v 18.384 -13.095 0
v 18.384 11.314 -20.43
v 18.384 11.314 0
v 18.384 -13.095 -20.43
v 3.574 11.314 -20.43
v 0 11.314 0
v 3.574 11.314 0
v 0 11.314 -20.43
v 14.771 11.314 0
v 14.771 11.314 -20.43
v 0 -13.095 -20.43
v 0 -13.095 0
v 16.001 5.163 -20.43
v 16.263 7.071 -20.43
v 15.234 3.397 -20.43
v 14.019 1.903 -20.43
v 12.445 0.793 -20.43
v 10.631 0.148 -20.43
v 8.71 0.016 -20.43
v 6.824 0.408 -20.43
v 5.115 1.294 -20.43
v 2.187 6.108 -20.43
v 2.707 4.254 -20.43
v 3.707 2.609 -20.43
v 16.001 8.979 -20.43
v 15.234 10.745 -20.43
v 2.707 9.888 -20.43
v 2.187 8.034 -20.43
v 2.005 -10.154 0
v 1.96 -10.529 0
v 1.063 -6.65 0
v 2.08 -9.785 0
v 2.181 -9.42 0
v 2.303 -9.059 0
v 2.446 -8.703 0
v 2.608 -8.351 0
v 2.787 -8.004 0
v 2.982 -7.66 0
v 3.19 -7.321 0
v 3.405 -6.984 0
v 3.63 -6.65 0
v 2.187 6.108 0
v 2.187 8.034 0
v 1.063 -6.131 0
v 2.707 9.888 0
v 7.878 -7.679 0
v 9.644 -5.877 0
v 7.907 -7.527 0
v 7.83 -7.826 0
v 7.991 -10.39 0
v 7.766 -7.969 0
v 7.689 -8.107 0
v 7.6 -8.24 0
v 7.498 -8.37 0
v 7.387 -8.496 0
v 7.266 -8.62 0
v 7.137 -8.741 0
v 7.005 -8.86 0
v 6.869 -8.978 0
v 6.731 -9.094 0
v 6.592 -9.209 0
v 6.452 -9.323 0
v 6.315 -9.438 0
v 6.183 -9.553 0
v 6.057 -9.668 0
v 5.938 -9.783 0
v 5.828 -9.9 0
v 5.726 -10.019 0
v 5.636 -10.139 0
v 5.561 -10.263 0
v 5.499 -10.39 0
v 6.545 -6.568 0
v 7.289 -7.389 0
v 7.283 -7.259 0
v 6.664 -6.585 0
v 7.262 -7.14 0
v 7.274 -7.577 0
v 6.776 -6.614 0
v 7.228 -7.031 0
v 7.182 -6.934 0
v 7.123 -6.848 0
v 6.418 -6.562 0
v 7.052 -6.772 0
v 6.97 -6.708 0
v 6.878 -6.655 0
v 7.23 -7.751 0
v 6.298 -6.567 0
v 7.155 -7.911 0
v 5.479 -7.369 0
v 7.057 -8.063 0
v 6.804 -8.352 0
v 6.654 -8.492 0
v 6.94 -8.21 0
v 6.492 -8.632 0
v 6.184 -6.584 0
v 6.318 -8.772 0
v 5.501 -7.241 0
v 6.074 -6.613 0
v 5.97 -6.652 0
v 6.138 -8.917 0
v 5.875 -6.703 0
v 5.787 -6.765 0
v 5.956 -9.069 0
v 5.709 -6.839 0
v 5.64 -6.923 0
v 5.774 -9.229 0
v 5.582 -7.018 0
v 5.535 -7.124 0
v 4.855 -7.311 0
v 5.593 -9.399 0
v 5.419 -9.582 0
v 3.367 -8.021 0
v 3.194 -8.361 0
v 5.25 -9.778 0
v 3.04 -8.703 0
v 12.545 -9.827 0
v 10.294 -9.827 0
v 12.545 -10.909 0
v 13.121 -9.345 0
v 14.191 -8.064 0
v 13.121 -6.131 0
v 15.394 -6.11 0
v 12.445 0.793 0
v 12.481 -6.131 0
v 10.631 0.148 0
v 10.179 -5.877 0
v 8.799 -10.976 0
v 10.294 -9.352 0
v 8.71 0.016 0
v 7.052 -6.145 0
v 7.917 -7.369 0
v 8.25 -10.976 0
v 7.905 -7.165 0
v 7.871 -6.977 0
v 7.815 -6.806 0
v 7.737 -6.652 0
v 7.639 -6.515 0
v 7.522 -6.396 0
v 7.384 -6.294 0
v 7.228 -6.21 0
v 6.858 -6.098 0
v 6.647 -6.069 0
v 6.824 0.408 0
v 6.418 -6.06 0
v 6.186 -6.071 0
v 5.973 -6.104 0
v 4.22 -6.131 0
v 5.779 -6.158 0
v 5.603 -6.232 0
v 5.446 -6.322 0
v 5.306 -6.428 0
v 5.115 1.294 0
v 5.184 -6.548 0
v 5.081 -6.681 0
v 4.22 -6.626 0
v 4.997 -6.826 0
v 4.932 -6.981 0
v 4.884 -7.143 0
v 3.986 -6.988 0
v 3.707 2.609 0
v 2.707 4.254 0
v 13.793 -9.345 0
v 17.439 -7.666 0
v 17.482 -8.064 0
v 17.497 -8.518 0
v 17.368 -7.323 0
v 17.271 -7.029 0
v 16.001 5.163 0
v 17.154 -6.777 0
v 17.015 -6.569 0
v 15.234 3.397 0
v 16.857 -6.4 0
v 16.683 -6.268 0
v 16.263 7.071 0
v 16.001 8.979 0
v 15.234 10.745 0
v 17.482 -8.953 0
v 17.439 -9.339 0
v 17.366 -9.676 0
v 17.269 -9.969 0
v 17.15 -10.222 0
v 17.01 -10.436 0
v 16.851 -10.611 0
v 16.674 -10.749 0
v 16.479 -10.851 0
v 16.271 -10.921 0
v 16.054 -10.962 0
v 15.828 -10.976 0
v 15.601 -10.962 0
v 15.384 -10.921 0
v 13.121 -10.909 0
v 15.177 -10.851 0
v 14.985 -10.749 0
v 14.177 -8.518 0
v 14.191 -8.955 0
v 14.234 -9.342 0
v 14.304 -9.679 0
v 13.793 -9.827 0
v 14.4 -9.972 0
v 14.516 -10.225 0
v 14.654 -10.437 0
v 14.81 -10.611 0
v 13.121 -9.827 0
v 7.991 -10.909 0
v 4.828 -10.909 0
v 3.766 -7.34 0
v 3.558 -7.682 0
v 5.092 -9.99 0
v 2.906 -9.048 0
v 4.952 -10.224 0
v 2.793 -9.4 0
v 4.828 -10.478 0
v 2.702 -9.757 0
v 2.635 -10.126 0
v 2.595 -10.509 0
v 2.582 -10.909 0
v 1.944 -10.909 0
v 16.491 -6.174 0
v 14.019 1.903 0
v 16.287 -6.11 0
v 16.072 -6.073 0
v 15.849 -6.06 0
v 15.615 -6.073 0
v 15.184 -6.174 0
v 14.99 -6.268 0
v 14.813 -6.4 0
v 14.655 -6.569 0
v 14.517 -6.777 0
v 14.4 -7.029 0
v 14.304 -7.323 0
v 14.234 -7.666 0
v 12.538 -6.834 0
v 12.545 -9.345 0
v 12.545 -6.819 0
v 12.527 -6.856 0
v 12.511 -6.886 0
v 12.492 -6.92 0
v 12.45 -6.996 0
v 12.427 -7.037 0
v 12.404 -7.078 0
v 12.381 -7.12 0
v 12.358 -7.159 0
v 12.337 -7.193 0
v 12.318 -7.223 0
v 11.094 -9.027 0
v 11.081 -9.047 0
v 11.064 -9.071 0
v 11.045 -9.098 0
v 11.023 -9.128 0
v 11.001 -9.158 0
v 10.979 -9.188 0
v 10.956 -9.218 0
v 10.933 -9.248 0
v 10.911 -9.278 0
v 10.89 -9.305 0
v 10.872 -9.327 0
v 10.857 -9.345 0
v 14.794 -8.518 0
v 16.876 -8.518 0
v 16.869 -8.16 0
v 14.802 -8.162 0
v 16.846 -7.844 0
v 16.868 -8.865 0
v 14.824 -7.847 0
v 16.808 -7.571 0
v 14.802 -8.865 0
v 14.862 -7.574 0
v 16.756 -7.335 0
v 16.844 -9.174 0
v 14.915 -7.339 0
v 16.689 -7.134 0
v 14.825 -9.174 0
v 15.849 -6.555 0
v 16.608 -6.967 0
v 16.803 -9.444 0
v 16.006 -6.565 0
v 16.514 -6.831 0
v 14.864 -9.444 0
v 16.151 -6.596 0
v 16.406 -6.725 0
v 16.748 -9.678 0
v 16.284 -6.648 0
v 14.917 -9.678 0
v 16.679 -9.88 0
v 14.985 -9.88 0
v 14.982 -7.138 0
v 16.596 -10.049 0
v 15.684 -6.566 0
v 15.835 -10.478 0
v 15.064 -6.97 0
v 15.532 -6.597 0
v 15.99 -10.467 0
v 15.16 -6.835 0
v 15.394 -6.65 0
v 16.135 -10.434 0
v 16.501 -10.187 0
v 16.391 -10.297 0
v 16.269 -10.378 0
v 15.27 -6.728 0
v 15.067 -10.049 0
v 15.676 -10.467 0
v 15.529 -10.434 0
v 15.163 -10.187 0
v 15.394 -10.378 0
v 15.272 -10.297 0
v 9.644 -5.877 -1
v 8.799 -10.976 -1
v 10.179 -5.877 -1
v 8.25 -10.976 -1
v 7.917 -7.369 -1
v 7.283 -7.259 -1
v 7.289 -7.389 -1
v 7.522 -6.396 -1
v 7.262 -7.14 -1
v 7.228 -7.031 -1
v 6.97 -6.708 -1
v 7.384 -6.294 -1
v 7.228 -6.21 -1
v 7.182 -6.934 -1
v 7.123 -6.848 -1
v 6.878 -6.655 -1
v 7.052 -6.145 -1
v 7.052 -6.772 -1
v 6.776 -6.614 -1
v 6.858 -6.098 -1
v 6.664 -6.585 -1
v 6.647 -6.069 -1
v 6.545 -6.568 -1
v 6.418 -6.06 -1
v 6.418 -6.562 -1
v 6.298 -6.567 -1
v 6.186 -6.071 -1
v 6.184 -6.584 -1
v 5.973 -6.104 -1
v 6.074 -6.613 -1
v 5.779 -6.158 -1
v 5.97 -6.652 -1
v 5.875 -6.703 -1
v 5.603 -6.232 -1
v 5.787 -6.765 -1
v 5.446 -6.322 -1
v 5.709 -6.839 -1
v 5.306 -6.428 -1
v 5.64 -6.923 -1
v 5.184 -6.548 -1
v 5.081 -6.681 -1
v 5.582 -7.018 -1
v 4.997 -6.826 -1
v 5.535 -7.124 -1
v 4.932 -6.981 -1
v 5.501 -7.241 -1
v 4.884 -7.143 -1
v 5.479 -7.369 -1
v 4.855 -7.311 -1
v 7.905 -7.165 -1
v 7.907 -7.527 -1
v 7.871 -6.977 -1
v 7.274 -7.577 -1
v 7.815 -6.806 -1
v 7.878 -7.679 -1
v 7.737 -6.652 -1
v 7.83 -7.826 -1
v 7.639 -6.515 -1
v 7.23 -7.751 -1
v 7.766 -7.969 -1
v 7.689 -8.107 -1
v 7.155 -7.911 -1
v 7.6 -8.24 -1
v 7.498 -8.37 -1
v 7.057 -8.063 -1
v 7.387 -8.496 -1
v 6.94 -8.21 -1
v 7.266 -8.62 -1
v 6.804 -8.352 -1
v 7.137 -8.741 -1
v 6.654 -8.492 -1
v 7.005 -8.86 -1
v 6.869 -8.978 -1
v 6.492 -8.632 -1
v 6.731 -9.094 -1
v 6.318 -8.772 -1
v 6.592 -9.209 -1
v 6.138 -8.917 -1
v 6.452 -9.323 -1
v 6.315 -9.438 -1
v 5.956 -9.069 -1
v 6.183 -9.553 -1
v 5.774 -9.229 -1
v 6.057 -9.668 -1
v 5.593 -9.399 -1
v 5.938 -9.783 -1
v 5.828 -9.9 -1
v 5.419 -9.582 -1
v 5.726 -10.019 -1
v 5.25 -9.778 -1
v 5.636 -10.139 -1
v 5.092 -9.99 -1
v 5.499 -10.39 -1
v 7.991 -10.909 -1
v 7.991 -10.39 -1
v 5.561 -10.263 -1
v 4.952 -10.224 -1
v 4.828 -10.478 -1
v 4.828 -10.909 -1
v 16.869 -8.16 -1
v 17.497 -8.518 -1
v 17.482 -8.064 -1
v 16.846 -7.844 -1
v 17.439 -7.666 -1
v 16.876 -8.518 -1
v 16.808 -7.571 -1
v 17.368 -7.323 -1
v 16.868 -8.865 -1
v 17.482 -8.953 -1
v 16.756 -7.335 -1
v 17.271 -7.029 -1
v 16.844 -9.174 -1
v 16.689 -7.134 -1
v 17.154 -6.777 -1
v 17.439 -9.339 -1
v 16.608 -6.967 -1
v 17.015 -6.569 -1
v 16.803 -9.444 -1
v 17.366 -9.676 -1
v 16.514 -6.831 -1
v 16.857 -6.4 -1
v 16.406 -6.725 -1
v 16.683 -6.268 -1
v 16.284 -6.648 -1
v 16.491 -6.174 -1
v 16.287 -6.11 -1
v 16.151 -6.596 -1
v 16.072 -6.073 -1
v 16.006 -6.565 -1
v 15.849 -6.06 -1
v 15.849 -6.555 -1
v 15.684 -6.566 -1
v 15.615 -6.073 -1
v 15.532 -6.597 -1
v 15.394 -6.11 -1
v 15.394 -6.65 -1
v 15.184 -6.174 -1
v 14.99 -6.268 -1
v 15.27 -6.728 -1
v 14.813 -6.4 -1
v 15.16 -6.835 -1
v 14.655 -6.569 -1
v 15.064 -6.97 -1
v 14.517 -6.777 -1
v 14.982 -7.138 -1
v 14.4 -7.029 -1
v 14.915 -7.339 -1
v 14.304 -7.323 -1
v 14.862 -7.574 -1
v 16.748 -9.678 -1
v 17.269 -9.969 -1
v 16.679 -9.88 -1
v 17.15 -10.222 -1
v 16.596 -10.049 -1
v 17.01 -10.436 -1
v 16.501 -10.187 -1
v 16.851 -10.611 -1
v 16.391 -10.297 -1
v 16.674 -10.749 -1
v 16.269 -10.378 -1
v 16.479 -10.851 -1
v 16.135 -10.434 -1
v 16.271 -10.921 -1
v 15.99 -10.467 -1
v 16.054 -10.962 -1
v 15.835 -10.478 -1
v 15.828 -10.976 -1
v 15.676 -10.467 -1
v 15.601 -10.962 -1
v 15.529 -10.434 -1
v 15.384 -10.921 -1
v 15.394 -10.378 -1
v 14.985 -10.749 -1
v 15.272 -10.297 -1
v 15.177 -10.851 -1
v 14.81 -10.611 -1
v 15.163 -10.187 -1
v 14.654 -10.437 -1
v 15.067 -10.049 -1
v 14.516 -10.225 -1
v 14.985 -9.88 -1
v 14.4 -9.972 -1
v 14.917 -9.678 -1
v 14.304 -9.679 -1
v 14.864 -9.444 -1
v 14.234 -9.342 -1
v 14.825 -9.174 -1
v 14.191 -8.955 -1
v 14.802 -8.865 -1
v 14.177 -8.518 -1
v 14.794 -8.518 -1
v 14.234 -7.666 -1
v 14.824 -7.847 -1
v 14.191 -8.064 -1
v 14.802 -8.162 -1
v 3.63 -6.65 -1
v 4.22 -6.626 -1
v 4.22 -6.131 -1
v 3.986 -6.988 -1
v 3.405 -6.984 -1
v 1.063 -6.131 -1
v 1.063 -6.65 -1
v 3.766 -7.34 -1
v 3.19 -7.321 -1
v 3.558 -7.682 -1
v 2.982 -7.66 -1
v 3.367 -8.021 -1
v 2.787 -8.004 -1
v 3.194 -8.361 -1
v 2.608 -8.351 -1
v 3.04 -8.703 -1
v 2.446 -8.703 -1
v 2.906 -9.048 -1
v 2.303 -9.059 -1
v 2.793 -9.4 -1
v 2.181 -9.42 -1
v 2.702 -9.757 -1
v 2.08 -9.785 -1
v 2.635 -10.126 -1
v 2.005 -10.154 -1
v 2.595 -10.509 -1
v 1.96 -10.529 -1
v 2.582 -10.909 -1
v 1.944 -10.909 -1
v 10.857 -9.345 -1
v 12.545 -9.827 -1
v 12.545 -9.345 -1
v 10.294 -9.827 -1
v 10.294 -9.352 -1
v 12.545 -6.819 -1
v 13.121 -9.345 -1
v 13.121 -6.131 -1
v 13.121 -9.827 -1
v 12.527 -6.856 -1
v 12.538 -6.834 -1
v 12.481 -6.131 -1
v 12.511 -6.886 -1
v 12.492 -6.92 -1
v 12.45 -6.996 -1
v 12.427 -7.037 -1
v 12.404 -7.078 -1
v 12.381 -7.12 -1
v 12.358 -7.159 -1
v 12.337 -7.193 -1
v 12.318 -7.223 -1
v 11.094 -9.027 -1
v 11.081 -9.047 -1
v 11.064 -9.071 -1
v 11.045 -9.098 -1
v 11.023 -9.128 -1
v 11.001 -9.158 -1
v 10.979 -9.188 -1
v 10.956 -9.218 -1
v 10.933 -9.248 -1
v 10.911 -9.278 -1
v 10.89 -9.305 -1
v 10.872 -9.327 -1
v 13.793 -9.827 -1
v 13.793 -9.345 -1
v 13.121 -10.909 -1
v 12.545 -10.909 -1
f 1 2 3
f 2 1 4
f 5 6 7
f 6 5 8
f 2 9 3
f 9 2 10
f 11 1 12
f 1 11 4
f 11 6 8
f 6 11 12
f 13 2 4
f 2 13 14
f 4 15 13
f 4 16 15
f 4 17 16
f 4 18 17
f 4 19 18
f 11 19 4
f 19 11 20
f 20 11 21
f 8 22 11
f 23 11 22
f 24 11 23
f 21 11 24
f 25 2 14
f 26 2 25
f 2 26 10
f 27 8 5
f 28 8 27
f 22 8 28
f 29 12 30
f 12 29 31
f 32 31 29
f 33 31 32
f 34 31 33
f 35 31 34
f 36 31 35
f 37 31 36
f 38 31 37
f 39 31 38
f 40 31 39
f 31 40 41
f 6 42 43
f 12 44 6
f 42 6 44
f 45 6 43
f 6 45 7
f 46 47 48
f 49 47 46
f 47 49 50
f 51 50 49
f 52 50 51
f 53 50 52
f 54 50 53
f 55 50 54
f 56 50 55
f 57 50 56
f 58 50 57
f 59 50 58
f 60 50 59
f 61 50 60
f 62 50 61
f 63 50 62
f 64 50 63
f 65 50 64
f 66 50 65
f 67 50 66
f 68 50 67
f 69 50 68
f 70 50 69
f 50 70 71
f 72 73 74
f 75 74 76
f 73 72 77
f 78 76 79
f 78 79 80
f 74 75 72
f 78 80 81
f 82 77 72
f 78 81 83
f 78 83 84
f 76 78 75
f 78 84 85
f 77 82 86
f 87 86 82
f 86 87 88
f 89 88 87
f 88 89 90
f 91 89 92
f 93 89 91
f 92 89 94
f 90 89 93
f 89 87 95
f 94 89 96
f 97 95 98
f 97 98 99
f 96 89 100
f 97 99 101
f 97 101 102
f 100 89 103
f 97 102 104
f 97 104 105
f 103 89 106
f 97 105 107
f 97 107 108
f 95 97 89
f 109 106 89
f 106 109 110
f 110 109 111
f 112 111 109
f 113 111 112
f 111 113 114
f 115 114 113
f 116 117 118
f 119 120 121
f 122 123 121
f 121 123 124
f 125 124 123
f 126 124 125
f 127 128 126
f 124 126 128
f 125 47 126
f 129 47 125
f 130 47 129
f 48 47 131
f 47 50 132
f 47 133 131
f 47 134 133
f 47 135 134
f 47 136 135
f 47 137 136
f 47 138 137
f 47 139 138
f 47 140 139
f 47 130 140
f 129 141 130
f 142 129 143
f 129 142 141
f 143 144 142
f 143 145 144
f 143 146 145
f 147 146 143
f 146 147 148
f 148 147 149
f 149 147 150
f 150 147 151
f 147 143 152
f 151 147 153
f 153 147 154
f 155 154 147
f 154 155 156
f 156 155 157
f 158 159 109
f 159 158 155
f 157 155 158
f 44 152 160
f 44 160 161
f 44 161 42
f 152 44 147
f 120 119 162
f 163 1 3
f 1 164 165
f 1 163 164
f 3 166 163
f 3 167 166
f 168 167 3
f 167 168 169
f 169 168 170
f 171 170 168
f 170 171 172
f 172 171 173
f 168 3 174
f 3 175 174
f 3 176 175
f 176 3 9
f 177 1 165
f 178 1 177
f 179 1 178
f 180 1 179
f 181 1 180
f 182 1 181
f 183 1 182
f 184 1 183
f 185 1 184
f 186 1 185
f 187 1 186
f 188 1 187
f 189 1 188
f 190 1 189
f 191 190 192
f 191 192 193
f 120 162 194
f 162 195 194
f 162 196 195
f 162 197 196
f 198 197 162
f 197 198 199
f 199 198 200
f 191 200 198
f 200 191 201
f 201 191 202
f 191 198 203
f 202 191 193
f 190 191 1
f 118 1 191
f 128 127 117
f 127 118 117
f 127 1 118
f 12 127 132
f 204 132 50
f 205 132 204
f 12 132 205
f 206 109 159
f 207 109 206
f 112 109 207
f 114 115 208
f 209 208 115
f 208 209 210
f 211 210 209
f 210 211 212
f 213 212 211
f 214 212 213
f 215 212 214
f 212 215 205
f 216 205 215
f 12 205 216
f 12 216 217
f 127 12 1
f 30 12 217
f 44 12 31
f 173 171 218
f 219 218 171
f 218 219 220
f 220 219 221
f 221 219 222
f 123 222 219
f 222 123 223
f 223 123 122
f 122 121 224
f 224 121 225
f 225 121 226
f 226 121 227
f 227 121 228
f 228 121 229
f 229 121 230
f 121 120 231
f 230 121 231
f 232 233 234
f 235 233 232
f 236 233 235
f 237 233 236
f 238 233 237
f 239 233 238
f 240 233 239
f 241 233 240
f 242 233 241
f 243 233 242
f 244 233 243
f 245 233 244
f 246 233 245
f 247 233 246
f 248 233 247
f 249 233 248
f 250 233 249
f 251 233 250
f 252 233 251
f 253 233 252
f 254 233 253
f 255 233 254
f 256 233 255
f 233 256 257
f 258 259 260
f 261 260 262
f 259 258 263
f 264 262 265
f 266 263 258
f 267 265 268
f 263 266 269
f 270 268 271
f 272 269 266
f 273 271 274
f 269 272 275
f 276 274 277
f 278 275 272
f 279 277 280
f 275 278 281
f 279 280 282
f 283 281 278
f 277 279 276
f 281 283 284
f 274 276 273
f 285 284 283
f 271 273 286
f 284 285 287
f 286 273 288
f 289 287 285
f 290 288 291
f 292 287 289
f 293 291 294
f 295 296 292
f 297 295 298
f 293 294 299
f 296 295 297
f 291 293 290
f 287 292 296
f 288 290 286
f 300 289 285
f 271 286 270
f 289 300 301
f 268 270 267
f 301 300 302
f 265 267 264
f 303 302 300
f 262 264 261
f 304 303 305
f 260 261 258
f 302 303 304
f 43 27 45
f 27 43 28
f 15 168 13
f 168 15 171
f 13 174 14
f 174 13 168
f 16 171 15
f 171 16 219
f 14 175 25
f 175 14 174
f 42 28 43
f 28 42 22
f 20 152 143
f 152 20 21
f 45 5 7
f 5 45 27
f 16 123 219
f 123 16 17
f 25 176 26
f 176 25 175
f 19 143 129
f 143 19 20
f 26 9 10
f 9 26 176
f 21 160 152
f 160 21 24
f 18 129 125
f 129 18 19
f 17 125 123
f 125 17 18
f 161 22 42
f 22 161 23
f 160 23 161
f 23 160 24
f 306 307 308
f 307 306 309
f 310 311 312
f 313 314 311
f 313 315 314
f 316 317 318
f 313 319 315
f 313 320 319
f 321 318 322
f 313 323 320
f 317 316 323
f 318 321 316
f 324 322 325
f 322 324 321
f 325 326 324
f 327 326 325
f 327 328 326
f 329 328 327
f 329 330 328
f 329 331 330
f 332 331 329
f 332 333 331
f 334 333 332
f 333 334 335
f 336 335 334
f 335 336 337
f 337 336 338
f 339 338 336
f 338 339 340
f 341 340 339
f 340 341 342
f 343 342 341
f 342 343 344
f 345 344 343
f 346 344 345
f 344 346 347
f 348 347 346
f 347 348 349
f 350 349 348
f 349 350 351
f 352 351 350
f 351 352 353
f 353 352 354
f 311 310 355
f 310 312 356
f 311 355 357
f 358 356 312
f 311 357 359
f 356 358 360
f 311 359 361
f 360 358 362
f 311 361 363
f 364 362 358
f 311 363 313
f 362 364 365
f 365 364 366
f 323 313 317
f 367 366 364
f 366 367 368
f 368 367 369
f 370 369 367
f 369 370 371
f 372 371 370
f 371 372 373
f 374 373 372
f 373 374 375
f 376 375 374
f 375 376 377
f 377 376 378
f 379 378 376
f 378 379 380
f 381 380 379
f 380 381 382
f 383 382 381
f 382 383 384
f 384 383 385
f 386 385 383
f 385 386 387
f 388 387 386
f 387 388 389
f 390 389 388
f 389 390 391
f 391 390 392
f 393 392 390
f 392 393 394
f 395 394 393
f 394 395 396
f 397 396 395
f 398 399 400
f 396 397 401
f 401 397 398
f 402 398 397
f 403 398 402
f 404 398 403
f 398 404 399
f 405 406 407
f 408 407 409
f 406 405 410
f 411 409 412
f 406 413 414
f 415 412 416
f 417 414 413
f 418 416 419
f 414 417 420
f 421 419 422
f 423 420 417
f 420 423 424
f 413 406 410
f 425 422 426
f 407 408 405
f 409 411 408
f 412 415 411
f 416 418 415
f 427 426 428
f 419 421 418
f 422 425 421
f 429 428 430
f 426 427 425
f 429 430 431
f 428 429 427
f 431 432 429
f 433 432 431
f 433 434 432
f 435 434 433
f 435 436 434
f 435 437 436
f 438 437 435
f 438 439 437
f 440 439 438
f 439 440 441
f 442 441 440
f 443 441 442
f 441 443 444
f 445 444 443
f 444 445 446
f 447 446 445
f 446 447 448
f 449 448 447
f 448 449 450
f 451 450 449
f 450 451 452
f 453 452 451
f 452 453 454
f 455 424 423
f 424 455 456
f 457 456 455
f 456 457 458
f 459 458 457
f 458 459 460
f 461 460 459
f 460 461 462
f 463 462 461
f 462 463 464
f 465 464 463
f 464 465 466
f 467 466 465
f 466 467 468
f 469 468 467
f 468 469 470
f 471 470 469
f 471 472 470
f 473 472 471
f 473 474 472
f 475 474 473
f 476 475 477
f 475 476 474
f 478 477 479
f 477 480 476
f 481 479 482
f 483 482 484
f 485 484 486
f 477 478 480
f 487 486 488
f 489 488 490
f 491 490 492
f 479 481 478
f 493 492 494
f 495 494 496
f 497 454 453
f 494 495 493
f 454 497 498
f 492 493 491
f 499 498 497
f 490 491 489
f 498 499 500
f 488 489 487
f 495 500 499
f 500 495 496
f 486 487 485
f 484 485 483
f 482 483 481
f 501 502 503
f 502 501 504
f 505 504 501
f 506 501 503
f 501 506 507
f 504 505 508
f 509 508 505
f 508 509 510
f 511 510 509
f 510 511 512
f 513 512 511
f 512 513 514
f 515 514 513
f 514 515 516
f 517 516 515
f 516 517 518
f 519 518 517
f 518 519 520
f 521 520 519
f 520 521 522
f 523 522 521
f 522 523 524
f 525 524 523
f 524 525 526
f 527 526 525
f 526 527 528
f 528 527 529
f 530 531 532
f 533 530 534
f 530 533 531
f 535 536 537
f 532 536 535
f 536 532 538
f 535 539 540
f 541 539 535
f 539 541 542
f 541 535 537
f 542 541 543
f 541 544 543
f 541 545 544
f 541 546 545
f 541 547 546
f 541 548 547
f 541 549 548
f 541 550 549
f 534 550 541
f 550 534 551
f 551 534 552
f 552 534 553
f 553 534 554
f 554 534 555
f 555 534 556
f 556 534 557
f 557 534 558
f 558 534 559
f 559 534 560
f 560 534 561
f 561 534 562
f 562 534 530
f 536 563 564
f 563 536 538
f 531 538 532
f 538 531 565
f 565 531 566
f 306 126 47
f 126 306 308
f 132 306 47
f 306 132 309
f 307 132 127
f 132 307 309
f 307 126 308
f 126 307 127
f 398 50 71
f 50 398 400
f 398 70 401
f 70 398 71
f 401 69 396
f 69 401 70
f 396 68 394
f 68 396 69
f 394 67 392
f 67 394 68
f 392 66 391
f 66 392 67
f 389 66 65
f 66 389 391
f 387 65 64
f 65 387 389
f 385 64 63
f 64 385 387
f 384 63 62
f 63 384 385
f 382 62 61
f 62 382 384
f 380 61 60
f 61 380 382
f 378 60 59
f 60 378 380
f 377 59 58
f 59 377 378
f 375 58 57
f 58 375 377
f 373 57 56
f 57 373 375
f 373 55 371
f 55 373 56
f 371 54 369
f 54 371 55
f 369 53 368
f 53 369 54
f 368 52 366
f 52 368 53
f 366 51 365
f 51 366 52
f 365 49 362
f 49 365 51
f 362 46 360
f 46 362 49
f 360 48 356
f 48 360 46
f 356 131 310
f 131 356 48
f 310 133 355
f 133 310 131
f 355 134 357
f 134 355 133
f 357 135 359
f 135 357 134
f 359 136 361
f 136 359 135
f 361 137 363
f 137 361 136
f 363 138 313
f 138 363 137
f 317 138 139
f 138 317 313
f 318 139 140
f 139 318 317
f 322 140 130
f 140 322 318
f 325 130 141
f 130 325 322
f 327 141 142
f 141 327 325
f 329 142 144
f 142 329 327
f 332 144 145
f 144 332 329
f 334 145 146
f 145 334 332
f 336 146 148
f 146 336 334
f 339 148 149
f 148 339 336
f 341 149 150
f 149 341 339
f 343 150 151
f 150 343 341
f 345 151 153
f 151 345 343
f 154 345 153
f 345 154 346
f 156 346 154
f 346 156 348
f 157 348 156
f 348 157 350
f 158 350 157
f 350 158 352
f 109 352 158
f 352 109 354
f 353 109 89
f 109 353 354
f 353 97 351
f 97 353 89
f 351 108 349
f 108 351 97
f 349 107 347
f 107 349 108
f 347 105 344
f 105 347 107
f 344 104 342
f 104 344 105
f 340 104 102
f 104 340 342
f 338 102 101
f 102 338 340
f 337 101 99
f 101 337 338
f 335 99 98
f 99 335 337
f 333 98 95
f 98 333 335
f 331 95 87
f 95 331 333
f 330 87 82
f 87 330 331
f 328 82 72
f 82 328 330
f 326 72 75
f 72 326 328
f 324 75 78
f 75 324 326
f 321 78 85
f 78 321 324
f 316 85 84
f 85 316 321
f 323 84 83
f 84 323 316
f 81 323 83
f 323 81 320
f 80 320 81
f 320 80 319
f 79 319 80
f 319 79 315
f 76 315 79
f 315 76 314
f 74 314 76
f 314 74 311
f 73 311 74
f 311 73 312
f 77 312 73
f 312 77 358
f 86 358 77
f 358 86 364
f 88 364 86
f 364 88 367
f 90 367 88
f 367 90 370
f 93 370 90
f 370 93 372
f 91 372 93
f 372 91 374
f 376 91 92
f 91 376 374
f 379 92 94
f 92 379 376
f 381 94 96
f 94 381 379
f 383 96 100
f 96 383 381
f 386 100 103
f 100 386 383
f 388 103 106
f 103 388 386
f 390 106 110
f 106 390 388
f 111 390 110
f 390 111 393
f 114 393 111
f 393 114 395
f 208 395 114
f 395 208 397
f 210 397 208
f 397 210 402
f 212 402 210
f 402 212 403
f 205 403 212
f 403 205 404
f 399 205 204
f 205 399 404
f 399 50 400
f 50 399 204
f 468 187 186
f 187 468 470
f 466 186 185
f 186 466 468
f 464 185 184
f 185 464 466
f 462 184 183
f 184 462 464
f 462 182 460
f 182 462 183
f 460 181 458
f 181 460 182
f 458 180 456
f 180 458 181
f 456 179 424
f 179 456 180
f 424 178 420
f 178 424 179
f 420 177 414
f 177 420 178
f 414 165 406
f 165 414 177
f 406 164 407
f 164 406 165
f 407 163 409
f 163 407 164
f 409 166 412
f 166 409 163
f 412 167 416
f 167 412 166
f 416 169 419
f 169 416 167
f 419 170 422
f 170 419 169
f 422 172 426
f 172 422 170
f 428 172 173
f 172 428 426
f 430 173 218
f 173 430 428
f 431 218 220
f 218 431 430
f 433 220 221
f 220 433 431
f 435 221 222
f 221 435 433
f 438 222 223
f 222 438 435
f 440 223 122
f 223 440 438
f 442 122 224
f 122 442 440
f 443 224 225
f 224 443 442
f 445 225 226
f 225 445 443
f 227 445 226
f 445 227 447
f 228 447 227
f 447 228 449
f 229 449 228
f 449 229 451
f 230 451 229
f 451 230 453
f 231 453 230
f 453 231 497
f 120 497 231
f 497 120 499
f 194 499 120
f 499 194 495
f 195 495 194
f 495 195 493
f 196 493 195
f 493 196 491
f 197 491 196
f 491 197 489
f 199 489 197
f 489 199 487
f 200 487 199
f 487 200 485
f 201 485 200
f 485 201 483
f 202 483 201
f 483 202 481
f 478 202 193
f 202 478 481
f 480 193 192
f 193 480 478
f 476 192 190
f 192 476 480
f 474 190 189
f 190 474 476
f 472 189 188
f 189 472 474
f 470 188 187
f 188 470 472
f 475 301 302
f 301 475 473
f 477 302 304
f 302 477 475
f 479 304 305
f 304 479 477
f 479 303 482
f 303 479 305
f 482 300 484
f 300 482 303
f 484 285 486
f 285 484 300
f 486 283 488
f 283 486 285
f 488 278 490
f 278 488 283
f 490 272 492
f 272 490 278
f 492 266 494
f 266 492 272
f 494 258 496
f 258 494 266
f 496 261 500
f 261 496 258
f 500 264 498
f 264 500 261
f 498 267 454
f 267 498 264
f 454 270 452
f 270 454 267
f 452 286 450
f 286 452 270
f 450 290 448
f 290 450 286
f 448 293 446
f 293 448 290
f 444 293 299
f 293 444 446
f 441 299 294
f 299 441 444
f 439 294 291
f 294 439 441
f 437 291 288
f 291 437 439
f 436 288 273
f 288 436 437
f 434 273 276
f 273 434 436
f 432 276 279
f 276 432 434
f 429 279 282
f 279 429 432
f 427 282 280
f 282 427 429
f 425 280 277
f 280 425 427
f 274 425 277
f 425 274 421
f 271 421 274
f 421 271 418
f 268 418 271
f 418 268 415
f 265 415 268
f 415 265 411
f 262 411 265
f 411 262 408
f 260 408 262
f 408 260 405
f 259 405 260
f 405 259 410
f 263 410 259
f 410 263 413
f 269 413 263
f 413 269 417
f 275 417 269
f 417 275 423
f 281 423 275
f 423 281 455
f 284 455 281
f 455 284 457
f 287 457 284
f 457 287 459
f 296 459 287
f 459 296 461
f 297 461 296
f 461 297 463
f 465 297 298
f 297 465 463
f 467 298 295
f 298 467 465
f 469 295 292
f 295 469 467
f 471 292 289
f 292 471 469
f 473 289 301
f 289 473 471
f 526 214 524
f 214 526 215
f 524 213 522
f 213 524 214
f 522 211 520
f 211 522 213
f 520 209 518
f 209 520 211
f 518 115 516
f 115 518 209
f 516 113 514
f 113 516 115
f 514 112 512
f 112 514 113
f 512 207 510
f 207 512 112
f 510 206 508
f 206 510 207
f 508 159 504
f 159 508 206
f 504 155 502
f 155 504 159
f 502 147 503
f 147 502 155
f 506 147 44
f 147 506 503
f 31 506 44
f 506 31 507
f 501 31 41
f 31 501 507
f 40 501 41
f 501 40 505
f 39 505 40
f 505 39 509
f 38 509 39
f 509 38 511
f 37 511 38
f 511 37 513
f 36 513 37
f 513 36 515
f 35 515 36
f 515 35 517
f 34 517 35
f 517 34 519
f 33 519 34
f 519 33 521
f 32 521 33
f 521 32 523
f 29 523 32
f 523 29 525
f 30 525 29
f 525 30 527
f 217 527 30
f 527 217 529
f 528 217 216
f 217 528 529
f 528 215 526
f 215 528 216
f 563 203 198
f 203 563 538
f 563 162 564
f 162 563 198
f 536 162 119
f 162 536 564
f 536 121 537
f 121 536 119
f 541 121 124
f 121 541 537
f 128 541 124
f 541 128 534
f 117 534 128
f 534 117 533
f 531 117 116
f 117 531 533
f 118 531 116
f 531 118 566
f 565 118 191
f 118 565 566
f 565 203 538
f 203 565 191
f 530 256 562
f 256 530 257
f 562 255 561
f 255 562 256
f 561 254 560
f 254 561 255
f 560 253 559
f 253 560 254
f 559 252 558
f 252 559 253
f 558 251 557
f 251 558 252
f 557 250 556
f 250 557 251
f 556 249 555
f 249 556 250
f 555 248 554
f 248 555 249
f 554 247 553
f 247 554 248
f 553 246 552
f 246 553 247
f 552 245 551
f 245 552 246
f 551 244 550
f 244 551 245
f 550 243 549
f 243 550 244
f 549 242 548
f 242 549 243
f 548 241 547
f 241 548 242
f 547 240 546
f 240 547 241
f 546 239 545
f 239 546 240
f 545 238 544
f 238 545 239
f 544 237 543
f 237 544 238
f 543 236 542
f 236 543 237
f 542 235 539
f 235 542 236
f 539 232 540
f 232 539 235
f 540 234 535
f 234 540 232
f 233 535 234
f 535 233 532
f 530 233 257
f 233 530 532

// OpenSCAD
// file: utils.scad
// Computes the number of fragments for a circle of radius r.
// For all r' > r, fragments_num(r') >= fragments_num(r).
// For all values, fragments_num > 3.
function fragments_num(r, fn, fs, fa) =
    let (
        fa_num = ceil(360 / fa),
        fs_num = ceil(r * 2 * PI / fs)
    )
    (fn > 0) ? max(fn, 3)
             : max(min(fa_num, fs_num), 5);

// Finds the radius to specify for a circle that has a minimum radius of r.
function find_outer_radius(r, fn=$fn, fs=$fs, fa=$fa) =
    let (
        fragments = fragments_num(r, fn, fs, fa),
        // fragments > 3 => cos(360 / fragments / 2) <= 1
        // => candidate_or >= r
        candidate_or = r / cos(360 / fragments / 2),
        // candidate_or >= r => candidate_fragments >= fragments
        candidate_fragments = fragments_num(candidate_or, fn, fs, fa),
        // candidate_fragments >= fragments => candidate_ir >= r
        candidate_ir = candidate_or * cos(360 / candidate_fragments / 2)
    )
    (candidate_ir >= r) ? candidate_or
    : assert(candidate_ir >= r);
// main file
use <utils.scad>;

// dimensions are in mm
actual_bible_diameter = 13.80;
side_clearance = 0.2;
bible_cutout_diameter = 2 * find_outer_radius(actual_bible_diameter/2) + side_clearance;

echo(bible_cutout_diameter);
bible_length = 22.70;

module bible(diameter, length) {
    rotate([-90,0,0])
        cylinder(h = length, d = diameter);
}

key_handle_width = 24.3;
key_blade_width = 8.11;
key_overhang = (key_handle_width - key_blade_width) / 2;

bottom_standoff = key_overhang + 5;
block_length = bible_length * 0.9;
block_width = bible_cutout_diameter * 1.3;
block_height = bible_cutout_diameter * 0.8 + bottom_standoff;

module bible_cutout() {
    translate([block_width / 2,
    (block_length - bible_length) / 2,
    bible_cutout_diameter / 2])
        bible(bible_cutout_diameter, bible_length);
}

epsilon = 0.1;
text_thickness = 1;

module bible_holder() {
    difference() {
        translate([0, 0, -bottom_standoff])
            cube([block_width, block_length, block_height]);
            
        bible_cutout();
    }   
}

module label() {
    translate([block_width/2, text_thickness, -bible_cutout_diameter * 0.6])
    rotate([90, 0, 0])
    linear_extrude(text_thickness + epsilon)
    text("72/40", size = 5, halign = "center", valign = "center");
}

rotate([-90, 0, 0])
difference() {
    bible_holder();
    label();
}
